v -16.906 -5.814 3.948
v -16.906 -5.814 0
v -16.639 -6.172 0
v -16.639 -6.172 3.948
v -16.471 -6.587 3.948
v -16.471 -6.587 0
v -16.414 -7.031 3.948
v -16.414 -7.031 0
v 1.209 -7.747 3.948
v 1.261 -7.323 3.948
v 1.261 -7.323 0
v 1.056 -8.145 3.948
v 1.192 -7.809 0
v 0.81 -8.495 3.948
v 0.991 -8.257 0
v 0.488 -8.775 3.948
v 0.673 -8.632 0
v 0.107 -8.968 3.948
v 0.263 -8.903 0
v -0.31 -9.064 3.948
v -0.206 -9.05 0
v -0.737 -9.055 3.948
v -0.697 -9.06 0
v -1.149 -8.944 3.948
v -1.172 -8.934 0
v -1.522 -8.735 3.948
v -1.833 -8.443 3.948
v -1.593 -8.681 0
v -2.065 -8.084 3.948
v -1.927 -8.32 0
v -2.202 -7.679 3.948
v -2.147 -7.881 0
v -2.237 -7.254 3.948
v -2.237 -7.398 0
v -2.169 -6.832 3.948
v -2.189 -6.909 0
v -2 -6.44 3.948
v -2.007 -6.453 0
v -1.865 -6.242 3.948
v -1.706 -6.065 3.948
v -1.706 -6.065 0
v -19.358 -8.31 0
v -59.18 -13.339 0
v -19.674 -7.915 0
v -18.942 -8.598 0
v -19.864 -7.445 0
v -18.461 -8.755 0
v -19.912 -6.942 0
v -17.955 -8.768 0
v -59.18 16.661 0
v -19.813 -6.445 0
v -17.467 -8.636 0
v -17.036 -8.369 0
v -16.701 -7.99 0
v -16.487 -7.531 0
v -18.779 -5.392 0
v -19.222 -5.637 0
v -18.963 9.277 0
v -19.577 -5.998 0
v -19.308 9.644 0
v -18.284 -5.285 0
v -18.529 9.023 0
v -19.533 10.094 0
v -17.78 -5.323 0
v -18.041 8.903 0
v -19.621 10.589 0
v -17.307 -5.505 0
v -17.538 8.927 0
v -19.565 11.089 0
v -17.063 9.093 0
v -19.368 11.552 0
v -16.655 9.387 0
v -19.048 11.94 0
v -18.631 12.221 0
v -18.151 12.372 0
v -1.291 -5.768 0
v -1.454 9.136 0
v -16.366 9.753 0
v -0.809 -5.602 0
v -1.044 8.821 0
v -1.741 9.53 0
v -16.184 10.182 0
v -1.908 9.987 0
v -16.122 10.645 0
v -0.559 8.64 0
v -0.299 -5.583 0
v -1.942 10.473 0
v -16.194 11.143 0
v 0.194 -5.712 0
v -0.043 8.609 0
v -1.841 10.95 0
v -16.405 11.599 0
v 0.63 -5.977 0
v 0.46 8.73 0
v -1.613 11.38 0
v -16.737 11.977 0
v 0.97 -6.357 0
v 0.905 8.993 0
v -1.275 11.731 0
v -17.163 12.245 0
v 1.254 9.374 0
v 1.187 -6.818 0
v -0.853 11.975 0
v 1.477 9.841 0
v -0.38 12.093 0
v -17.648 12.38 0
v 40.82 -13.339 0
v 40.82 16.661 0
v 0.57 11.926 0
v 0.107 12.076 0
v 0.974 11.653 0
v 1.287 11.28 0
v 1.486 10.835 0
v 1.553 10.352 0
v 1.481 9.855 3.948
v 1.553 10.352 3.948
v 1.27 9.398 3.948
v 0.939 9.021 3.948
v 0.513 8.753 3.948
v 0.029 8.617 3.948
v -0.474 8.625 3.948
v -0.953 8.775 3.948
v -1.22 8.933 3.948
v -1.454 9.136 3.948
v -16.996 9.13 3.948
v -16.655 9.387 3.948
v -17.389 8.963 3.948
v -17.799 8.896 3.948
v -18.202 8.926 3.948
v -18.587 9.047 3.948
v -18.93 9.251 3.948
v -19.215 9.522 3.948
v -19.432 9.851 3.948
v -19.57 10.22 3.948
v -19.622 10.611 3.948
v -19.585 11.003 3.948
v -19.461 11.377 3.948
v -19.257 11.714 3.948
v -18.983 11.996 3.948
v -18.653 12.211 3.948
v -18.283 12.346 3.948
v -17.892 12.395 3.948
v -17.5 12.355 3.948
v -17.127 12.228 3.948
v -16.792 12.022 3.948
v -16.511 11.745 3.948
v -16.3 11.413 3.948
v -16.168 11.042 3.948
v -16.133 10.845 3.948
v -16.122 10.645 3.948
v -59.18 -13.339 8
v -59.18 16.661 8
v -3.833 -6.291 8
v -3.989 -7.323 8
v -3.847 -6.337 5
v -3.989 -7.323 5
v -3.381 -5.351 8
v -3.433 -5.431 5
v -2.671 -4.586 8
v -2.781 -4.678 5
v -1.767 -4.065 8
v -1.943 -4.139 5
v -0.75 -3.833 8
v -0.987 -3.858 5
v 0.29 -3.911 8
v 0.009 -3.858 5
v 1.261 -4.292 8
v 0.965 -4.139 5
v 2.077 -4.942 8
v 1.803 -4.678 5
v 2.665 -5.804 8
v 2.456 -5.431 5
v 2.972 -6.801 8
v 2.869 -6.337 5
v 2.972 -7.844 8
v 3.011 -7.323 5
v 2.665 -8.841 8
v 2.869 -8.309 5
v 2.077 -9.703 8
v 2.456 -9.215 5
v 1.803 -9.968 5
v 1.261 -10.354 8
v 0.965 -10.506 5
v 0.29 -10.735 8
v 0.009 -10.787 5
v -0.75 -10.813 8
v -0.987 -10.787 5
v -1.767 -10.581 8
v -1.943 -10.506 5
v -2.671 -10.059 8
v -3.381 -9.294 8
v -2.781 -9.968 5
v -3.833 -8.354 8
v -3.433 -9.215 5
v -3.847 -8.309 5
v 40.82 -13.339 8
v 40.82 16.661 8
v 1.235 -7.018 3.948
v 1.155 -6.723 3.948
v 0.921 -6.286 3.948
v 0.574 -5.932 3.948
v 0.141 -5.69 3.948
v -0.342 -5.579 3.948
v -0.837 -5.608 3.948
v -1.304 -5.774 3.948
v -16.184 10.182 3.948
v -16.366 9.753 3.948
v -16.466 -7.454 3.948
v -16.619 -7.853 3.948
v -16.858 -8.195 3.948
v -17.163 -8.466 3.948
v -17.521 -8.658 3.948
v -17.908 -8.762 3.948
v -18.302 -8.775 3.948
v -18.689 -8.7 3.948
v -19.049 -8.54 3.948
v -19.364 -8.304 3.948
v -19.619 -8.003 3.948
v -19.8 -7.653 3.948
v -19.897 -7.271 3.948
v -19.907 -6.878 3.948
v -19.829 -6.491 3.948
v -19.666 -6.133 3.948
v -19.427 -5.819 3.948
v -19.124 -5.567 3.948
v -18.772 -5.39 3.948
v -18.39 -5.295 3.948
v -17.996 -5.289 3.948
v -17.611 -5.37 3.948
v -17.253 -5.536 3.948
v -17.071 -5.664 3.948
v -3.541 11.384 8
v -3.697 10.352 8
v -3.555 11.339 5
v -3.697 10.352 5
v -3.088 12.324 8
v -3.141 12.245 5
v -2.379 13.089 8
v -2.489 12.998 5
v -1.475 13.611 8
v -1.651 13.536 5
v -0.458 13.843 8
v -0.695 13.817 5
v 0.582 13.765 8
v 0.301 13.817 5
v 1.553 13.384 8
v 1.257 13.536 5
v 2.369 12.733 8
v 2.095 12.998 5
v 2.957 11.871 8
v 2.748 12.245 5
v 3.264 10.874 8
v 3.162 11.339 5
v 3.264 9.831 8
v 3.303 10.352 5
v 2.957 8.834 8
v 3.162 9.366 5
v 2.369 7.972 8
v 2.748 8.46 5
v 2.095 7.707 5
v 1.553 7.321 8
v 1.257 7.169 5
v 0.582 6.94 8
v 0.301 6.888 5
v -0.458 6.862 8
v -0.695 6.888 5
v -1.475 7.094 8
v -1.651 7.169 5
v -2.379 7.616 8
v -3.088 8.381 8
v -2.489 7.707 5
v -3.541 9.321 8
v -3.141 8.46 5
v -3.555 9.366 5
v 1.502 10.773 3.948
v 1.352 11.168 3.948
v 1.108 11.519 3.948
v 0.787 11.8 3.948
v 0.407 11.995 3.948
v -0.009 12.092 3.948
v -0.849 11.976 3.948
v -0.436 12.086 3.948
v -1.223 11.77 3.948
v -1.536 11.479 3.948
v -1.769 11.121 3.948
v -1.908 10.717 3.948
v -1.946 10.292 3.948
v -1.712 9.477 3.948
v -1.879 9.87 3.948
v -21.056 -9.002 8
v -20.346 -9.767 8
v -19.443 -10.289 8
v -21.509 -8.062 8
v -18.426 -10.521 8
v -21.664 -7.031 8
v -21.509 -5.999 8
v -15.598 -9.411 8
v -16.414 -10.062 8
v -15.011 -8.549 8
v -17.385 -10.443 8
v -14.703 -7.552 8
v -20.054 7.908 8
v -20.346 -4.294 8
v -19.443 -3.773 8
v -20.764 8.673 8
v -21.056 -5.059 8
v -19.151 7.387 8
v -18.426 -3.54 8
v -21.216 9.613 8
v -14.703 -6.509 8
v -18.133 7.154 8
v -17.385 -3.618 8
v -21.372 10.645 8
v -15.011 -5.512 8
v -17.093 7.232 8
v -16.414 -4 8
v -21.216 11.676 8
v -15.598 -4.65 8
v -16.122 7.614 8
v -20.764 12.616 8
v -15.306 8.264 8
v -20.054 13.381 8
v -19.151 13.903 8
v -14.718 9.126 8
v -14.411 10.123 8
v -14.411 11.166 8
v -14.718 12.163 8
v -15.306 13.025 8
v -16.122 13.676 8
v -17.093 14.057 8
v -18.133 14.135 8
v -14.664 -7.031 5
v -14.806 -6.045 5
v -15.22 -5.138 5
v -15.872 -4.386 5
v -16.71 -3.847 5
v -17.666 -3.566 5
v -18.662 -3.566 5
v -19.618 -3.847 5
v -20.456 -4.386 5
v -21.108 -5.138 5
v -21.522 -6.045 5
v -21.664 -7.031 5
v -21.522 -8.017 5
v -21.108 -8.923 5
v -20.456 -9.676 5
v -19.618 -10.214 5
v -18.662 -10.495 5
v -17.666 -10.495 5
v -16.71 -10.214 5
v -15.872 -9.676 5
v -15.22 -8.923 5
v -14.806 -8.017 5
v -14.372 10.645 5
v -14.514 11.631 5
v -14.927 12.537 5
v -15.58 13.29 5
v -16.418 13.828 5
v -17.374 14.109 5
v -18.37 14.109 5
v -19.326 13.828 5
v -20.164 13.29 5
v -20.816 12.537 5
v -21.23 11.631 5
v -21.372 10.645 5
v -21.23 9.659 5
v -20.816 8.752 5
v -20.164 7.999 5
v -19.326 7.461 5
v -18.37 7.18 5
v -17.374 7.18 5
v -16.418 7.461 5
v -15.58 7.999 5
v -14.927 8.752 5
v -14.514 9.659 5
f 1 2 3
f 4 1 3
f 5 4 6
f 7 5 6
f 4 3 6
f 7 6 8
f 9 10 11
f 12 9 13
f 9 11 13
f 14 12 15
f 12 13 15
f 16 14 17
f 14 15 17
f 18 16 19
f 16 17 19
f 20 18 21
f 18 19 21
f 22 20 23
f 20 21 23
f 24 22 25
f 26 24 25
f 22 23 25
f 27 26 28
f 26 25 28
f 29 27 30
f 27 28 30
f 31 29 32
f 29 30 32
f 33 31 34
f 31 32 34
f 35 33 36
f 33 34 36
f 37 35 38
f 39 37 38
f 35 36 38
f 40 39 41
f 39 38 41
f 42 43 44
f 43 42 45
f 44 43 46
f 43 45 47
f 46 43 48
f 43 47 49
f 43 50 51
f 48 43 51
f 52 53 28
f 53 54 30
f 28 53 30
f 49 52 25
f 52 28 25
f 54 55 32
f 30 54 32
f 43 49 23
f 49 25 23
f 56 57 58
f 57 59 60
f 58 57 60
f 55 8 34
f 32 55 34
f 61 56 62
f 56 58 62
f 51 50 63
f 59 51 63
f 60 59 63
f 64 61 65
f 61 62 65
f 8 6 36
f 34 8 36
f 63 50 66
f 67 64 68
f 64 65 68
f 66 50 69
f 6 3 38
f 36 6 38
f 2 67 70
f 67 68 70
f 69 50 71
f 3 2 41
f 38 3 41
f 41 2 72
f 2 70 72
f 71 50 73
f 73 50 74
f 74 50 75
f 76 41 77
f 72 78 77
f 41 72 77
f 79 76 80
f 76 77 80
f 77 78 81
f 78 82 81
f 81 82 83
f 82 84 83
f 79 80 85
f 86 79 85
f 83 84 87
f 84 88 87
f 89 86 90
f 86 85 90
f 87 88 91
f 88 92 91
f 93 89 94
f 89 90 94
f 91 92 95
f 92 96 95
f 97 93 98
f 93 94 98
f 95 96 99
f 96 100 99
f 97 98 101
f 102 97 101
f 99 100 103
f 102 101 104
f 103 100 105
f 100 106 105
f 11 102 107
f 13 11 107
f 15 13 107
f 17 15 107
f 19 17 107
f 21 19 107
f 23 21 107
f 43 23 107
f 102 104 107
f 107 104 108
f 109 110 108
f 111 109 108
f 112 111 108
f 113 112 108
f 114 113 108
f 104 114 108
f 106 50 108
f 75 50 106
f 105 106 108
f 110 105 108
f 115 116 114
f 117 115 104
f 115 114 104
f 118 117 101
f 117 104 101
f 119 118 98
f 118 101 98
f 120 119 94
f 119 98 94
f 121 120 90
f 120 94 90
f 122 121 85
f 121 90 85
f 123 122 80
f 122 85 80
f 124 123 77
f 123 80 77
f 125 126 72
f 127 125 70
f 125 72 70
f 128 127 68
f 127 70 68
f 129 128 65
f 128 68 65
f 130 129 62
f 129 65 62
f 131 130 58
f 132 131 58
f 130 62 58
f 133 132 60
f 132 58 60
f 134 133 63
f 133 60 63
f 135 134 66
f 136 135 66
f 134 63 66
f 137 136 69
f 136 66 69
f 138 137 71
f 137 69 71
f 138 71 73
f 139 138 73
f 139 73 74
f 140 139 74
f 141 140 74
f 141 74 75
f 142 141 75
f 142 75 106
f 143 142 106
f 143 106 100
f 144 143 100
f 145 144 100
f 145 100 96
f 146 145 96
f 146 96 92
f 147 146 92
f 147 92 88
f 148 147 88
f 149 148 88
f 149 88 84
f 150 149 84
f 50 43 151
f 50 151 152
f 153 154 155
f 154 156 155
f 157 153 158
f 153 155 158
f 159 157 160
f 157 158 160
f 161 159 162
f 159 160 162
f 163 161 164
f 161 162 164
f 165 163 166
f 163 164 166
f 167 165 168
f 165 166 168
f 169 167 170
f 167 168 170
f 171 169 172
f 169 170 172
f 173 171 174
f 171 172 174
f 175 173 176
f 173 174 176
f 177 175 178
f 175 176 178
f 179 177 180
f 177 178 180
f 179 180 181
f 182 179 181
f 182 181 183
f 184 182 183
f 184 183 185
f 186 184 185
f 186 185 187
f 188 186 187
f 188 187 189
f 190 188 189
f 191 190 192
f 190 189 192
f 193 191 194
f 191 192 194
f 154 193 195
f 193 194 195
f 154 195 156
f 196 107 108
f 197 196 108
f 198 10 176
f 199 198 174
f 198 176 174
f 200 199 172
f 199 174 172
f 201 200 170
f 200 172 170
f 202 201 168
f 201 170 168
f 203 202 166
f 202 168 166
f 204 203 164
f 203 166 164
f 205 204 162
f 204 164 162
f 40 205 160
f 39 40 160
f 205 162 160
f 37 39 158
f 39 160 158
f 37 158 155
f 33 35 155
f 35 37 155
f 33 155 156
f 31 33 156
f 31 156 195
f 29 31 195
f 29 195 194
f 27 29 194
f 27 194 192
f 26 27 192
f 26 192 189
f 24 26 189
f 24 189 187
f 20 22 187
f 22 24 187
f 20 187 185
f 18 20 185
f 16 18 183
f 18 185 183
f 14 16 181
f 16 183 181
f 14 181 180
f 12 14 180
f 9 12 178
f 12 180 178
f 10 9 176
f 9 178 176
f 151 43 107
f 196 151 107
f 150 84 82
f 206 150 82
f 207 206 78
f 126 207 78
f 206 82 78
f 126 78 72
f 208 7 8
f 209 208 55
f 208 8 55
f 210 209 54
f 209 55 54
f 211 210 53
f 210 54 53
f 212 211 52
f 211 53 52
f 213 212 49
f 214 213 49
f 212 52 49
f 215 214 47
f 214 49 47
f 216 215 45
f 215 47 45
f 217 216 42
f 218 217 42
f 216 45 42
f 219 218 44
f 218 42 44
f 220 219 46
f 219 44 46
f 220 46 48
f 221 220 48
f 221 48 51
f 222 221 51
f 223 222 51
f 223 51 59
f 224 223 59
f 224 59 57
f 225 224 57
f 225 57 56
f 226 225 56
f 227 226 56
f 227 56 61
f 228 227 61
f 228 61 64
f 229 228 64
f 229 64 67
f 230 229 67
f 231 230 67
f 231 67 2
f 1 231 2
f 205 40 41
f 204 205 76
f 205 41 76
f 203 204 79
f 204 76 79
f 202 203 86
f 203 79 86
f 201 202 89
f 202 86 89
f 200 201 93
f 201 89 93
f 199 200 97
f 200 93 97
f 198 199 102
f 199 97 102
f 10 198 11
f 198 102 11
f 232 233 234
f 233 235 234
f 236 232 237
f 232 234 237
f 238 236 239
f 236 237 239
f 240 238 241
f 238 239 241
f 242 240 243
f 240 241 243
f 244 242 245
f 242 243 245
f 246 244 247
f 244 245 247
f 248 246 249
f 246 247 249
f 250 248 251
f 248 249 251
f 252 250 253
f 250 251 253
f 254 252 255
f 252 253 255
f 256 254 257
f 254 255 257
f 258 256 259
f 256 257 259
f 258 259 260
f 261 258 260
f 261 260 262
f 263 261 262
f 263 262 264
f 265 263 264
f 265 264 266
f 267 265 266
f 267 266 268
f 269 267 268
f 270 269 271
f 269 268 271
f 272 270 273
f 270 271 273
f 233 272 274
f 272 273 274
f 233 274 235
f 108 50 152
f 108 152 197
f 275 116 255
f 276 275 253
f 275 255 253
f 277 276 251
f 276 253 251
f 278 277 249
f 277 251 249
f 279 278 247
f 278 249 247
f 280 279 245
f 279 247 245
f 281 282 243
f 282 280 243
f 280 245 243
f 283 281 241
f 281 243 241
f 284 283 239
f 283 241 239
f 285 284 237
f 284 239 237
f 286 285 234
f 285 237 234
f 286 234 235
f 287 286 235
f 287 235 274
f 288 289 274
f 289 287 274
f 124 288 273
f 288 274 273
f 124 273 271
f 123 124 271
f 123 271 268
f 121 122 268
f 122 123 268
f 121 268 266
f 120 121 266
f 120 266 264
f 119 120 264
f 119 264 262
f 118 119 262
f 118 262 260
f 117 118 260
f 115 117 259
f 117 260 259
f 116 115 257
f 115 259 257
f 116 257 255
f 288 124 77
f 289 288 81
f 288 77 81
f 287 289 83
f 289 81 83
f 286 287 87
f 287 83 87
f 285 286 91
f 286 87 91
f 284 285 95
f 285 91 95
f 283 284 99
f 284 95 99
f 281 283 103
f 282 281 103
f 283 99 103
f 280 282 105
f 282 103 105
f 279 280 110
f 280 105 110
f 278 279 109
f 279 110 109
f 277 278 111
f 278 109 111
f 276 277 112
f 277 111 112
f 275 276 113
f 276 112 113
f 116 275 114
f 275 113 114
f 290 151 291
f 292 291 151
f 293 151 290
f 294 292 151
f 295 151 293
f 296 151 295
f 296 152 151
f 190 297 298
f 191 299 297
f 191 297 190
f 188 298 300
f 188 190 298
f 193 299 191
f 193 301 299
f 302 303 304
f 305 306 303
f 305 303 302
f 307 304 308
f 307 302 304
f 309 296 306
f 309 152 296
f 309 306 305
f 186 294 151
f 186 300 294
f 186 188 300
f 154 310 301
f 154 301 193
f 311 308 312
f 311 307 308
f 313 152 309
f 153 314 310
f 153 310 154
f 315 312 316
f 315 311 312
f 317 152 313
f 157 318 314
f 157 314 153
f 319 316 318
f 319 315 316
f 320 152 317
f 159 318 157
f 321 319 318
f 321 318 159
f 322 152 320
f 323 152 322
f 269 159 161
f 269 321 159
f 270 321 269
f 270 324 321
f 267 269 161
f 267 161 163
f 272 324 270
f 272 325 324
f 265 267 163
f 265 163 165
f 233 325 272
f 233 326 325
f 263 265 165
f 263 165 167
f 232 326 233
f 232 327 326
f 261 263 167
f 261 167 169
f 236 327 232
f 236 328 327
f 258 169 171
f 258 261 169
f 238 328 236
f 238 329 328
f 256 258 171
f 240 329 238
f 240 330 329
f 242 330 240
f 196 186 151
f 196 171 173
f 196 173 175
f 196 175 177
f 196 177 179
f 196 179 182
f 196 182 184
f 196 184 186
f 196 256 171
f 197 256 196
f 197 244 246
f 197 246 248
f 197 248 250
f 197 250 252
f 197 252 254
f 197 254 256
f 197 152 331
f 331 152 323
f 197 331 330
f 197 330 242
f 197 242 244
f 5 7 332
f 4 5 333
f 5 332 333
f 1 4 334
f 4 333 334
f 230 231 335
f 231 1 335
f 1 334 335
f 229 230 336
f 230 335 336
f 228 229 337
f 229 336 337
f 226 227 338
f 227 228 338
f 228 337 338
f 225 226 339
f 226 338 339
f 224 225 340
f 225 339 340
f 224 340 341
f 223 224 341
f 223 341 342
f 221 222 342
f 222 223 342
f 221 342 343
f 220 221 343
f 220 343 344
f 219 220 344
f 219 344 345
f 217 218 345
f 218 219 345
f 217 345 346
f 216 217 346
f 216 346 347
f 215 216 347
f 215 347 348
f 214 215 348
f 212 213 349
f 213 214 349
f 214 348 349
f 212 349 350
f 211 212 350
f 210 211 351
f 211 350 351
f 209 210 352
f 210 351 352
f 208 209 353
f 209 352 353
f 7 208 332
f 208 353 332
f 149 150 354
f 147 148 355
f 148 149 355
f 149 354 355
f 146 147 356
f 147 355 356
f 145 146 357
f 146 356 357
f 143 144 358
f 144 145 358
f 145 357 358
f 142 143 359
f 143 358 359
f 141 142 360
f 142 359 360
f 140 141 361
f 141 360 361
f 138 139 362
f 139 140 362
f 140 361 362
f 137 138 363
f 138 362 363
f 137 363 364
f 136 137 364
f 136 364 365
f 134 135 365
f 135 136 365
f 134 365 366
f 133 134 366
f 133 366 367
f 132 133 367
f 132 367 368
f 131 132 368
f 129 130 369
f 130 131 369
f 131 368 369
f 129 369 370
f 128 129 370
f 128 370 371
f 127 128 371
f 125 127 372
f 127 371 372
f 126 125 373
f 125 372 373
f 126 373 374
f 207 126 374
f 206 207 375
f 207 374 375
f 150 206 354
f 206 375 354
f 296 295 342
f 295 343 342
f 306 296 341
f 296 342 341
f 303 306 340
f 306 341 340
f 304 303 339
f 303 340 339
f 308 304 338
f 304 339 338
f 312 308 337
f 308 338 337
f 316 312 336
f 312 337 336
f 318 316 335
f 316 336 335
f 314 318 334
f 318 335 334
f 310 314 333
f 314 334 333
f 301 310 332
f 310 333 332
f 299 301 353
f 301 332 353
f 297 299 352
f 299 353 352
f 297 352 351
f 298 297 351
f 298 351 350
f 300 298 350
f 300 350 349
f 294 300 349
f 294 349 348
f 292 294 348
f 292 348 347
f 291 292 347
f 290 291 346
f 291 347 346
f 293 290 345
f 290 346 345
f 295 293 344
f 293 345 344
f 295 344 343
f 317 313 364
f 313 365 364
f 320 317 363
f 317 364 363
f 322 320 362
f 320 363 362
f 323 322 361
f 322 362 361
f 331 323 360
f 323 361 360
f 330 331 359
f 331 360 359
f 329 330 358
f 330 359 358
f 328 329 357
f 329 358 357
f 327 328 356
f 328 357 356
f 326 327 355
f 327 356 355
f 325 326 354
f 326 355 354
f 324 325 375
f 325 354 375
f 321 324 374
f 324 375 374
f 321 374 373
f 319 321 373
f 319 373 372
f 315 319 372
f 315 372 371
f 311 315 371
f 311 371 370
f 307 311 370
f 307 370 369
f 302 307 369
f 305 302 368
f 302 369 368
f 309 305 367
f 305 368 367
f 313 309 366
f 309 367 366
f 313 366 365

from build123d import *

# Parameters (mm, degrees)
F0_W     = 100
F0_H     = 30
F1_DEPTH = 8
F3_D     = 7
F3_DEPTH = 3
F3_TIP   = 2.1030121666


with BuildPart() as f1:
    # F0 (on Top) → F1 (new body)
    with BuildSketch(Plane.XY):
        with Locations((-9.1803266555, 1.6609177441)):
            Rectangle(F0_W, F0_H)
        with BuildLine():
            ThreePointArc((-16.4140304677, -7.0306336602), (-19.7862985458, -7.6869463014), (-16.906311934, -5.8138164636))
            ThreePointArc((-16.906311934, -5.8138164636), (-16.5417623897, -6.374321019), (-16.4140304677, -7.0306336602))
        make_face(mode=Mode.SUBTRACT)
        with BuildLine():
            ThreePointArc((1.2612247488, -7.3227860681), (-1.1718088909, -8.9339859462), (-1.7055924478, -6.0650675344))
            ThreePointArc((-1.7055924478, -6.0650675344), (0.1942583885, -5.7115861901), (1.2612247488, -7.3227860681))
        make_face(mode=Mode.SUBTRACT)
        with BuildLine():
            ThreePointArc((-16.6550608632, 9.3869030227), (-19.4830779378, 11.3276551961), (-16.1218780598, 10.6446215564))
            ThreePointArc((-16.1218780598, 10.6446215564), (-16.2606781817, 9.9615879167), (-16.6550608632, 9.3869030227))
        make_face(mode=Mode.SUBTRACT)
        with BuildLine():
            ThreePointArc((1.5533771568, 10.3524691484), (0.459689798, 8.7302010704), (-1.4543413769, 9.1356519518))
            ThreePointArc((-1.4543413769, 9.1356519518), (-0.8529354844, 11.9747372265), (1.5533771568, 10.3524691484))
        make_face(mode=Mode.SUBTRACT)
    extrude(amount=F1_DEPTH)

    # F3
    with Locations(Plane.XY.offset(8)):
        with Locations((-0.4887752512, -7.3227860681), (-18.1640304677, -7.0306336602), (-17.8718780598, 10.6446215564), (-0.1966228432, 10.3524691484)):
            Hole(F3_D / 2, depth=F3_DEPTH)
            with Locations((0, 0, -(F3_DEPTH + F3_TIP / 2))):  # 118° drill point
                Cone(0, F3_D / 2, F3_TIP, mode=Mode.SUBTRACT)


solid = f1.part
